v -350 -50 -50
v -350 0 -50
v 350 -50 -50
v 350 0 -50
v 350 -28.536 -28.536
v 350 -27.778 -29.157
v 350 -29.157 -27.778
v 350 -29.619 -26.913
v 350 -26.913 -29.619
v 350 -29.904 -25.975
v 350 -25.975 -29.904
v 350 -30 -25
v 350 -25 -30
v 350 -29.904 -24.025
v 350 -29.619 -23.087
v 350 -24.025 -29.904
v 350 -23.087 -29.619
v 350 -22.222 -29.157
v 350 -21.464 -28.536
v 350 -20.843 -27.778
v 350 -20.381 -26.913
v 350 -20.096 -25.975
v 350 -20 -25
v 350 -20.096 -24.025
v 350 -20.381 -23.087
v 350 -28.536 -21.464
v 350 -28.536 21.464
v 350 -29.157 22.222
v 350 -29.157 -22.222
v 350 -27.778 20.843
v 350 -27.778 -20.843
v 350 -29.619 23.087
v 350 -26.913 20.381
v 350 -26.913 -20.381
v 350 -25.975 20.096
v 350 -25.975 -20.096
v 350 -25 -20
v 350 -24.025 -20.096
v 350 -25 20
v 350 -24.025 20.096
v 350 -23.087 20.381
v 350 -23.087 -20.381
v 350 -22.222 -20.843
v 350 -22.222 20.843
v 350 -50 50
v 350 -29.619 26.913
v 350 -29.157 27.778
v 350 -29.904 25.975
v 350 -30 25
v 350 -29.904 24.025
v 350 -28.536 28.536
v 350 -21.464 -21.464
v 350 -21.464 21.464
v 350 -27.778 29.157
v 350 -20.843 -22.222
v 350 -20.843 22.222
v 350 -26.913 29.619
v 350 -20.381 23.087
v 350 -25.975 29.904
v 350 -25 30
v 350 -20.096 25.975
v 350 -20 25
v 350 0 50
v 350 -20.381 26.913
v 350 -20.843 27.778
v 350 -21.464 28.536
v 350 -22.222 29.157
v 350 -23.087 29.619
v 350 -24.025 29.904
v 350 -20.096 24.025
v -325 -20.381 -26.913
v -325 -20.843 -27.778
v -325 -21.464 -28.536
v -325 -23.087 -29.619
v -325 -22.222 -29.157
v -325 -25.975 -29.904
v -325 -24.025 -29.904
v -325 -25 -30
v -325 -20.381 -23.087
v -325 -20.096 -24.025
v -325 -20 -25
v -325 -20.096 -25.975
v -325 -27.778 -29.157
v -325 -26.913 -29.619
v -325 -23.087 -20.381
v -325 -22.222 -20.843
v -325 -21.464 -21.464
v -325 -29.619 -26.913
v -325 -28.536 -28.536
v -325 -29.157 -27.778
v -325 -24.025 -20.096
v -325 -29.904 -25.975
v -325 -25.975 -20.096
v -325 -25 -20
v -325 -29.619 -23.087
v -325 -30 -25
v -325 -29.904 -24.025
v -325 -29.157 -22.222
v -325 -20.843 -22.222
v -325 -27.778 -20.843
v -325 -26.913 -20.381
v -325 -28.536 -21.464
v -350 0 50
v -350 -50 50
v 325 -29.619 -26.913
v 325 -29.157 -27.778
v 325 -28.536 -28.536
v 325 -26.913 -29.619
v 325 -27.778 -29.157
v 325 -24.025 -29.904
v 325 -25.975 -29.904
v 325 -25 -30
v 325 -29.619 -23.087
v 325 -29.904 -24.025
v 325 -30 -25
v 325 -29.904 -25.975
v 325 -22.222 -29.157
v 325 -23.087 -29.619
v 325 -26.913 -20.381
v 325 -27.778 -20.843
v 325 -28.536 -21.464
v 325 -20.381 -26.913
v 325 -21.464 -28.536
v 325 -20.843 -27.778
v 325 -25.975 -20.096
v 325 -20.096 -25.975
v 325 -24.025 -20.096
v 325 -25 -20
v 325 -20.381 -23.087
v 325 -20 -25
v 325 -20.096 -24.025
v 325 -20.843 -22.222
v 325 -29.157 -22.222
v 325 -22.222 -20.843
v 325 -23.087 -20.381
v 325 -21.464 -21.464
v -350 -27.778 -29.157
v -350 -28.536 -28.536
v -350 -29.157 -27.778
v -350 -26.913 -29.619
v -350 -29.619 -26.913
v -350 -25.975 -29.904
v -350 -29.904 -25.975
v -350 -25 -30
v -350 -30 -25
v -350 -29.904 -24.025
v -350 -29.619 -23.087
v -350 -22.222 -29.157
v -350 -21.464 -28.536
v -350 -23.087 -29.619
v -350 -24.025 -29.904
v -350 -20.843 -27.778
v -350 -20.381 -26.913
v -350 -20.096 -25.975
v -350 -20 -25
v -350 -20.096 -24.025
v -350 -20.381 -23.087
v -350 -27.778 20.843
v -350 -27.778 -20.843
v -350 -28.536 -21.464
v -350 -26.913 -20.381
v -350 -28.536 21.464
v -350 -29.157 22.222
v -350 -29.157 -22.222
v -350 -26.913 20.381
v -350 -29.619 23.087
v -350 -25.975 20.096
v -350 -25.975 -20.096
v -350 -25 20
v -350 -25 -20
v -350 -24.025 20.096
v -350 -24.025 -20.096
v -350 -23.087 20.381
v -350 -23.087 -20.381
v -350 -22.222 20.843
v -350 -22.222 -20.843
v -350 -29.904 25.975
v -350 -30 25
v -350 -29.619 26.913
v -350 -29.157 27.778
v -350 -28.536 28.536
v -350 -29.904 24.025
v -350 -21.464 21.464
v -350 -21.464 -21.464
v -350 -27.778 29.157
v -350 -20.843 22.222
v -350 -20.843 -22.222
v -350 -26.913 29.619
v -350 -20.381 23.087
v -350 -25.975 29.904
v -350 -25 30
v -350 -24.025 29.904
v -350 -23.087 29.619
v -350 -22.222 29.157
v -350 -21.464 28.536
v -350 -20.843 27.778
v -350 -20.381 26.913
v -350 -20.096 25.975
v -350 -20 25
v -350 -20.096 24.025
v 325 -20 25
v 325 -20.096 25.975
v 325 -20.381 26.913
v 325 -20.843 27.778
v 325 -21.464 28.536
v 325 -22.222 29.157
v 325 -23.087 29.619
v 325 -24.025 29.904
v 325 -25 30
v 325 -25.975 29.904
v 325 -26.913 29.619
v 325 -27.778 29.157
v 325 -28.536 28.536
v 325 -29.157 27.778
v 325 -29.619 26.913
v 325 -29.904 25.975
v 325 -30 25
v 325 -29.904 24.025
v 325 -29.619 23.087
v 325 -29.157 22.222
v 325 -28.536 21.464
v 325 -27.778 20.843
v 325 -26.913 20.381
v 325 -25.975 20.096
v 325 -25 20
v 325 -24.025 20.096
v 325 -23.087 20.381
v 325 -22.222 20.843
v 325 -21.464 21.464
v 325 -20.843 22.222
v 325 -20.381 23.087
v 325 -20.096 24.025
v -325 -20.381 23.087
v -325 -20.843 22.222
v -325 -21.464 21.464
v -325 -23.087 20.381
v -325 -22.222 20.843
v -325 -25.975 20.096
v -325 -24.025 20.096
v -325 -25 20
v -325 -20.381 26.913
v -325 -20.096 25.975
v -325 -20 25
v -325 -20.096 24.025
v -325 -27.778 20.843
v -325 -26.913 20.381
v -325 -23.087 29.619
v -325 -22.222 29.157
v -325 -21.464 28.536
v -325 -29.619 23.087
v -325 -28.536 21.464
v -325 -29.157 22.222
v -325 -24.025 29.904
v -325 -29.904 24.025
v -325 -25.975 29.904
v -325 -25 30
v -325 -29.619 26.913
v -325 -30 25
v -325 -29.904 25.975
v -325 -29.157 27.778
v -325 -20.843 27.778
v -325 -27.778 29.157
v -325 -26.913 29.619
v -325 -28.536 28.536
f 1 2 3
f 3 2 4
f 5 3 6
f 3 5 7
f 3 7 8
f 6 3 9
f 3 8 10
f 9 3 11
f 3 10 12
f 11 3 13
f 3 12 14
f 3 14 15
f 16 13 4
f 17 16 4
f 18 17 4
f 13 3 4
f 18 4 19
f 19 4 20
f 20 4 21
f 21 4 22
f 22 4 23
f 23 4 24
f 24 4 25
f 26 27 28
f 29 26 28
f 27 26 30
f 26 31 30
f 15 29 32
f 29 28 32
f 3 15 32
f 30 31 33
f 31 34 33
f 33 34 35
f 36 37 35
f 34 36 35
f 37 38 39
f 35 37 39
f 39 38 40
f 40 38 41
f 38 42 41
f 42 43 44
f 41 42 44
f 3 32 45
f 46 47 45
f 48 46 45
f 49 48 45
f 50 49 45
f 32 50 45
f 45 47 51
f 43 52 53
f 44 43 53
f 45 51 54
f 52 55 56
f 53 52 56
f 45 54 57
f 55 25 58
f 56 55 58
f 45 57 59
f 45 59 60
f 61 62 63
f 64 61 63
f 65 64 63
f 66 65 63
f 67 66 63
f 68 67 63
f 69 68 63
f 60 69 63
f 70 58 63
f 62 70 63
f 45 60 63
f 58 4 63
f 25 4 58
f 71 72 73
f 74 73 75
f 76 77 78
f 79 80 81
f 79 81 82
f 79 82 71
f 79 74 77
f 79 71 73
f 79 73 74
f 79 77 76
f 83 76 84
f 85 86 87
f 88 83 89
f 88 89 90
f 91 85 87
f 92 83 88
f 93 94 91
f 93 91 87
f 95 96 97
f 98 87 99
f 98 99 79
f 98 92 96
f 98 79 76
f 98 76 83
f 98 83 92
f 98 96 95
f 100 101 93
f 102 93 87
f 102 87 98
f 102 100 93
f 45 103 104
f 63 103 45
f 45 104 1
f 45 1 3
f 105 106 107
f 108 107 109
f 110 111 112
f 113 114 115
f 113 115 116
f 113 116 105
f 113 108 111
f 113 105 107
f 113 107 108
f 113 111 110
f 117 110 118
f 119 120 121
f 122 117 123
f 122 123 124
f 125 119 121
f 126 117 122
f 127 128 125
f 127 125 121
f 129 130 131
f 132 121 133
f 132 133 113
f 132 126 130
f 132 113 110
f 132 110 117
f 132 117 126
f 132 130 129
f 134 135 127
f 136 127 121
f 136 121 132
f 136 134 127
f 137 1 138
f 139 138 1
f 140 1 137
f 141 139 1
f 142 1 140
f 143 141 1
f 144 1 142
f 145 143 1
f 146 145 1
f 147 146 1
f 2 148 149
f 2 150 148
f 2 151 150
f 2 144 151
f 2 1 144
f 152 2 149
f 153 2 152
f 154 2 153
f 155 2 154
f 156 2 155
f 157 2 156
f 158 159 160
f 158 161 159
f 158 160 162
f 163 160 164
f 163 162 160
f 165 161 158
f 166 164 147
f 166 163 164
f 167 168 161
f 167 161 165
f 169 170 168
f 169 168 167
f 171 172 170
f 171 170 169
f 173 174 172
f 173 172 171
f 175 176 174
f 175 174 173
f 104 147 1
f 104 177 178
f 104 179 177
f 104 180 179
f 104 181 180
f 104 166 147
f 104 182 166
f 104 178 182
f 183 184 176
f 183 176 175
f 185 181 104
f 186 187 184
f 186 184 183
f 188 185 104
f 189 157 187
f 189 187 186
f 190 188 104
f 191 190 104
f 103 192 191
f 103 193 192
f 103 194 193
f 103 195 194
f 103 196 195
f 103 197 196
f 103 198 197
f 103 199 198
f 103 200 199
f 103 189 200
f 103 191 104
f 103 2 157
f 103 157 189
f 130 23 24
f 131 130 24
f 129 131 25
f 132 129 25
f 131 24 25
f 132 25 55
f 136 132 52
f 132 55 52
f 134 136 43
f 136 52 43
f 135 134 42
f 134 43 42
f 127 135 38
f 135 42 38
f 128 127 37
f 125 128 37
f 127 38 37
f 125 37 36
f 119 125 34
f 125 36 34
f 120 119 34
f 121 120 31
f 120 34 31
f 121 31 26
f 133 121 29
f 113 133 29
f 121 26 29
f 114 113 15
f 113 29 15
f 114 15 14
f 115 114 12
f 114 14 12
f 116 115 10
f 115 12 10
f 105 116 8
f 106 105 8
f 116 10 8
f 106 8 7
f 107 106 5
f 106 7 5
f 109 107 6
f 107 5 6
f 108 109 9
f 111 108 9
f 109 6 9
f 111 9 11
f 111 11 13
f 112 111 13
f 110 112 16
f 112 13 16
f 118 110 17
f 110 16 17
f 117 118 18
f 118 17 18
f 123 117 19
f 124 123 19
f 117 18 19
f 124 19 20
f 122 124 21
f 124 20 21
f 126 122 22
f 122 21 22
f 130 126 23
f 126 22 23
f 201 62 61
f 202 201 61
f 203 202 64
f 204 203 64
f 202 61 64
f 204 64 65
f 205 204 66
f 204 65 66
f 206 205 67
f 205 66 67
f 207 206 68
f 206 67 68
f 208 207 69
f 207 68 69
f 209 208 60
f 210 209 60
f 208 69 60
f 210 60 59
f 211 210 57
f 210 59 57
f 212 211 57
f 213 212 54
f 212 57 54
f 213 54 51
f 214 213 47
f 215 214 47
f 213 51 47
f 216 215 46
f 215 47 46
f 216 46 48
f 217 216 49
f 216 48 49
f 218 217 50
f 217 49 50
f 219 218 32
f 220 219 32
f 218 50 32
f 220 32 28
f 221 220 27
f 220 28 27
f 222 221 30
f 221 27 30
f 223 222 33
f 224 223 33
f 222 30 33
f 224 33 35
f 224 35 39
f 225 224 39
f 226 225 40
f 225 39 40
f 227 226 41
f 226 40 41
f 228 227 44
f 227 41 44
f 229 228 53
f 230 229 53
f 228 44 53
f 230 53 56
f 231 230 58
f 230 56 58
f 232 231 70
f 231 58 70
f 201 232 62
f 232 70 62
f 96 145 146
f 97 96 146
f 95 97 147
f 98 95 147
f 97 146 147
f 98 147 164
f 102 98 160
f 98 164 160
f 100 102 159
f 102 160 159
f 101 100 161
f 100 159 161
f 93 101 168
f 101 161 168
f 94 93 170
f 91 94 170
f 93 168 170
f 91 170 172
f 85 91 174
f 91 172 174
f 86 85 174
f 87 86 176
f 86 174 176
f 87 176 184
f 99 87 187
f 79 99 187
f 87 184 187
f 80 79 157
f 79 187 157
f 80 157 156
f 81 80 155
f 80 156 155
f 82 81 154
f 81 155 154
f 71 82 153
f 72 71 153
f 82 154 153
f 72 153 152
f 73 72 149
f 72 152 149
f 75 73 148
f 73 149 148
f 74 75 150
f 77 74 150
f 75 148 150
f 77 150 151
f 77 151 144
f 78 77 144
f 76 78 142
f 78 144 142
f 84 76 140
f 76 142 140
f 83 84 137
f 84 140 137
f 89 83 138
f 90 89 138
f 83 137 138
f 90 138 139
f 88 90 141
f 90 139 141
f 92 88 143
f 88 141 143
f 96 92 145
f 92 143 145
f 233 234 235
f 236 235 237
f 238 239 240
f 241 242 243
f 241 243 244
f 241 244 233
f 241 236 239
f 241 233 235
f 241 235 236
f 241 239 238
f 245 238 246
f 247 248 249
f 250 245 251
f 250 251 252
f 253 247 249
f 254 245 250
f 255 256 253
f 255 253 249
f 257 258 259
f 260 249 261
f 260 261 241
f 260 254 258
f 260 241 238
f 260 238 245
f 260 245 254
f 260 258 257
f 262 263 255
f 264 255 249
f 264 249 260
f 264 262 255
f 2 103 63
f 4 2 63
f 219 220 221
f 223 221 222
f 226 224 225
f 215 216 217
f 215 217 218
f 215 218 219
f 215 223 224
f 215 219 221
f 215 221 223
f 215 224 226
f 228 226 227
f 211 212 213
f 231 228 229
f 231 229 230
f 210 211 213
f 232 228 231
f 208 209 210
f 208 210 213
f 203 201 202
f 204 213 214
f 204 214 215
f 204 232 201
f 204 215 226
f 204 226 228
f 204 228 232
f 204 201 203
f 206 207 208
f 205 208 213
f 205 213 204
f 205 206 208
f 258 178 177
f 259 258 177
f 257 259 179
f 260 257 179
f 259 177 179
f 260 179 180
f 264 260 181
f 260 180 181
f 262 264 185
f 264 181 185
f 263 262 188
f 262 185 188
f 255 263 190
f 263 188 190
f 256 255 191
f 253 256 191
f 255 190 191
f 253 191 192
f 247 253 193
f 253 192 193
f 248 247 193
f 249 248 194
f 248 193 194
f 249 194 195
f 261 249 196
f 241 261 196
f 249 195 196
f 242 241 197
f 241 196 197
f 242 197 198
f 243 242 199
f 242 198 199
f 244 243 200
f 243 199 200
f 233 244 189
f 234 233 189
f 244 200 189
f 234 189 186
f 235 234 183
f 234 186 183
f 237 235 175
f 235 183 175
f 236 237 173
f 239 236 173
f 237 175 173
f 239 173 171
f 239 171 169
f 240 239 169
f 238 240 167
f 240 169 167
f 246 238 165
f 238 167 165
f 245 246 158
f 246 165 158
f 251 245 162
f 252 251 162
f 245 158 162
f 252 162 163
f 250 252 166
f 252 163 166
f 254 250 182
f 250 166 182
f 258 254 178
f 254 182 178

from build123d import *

# Parameters (mm, degrees)
F0_W     = 700
F0_H     = 100
F1_DEPTH = 50
F3_R     = 5
F4_DEPTH = 25
F2_R     = 5
F5_DEPTH = 25


with BuildPart() as f1:
    # F0 (on Front) → F1 (new body)
    with BuildSketch(Plane.XZ):
        Rectangle(F0_W, F0_H)
    extrude(amount=F1_DEPTH)

    # F3 (on face) → F4 (cut)
    with BuildSketch(Plane(origin=(-350, 0, 0), x_dir=(0, -1, 0), z_dir=(-1, 0, 0))):
        with Locations((25, 25)):
            Circle(F3_R)
        with Locations((25, -25)):
            Circle(F3_R)
    extrude(amount=-F4_DEPTH, mode=Mode.SUBTRACT)

    # F2 (on face) → F5 (cut)
    with BuildSketch(Plane.YZ.offset(350)):
        with Locations((-25, 25)):
            Circle(F2_R)
        with Locations((-25, -25)):
            Circle(F2_R)
    extrude(amount=-F5_DEPTH, mode=Mode.SUBTRACT)


solid = f1.part
